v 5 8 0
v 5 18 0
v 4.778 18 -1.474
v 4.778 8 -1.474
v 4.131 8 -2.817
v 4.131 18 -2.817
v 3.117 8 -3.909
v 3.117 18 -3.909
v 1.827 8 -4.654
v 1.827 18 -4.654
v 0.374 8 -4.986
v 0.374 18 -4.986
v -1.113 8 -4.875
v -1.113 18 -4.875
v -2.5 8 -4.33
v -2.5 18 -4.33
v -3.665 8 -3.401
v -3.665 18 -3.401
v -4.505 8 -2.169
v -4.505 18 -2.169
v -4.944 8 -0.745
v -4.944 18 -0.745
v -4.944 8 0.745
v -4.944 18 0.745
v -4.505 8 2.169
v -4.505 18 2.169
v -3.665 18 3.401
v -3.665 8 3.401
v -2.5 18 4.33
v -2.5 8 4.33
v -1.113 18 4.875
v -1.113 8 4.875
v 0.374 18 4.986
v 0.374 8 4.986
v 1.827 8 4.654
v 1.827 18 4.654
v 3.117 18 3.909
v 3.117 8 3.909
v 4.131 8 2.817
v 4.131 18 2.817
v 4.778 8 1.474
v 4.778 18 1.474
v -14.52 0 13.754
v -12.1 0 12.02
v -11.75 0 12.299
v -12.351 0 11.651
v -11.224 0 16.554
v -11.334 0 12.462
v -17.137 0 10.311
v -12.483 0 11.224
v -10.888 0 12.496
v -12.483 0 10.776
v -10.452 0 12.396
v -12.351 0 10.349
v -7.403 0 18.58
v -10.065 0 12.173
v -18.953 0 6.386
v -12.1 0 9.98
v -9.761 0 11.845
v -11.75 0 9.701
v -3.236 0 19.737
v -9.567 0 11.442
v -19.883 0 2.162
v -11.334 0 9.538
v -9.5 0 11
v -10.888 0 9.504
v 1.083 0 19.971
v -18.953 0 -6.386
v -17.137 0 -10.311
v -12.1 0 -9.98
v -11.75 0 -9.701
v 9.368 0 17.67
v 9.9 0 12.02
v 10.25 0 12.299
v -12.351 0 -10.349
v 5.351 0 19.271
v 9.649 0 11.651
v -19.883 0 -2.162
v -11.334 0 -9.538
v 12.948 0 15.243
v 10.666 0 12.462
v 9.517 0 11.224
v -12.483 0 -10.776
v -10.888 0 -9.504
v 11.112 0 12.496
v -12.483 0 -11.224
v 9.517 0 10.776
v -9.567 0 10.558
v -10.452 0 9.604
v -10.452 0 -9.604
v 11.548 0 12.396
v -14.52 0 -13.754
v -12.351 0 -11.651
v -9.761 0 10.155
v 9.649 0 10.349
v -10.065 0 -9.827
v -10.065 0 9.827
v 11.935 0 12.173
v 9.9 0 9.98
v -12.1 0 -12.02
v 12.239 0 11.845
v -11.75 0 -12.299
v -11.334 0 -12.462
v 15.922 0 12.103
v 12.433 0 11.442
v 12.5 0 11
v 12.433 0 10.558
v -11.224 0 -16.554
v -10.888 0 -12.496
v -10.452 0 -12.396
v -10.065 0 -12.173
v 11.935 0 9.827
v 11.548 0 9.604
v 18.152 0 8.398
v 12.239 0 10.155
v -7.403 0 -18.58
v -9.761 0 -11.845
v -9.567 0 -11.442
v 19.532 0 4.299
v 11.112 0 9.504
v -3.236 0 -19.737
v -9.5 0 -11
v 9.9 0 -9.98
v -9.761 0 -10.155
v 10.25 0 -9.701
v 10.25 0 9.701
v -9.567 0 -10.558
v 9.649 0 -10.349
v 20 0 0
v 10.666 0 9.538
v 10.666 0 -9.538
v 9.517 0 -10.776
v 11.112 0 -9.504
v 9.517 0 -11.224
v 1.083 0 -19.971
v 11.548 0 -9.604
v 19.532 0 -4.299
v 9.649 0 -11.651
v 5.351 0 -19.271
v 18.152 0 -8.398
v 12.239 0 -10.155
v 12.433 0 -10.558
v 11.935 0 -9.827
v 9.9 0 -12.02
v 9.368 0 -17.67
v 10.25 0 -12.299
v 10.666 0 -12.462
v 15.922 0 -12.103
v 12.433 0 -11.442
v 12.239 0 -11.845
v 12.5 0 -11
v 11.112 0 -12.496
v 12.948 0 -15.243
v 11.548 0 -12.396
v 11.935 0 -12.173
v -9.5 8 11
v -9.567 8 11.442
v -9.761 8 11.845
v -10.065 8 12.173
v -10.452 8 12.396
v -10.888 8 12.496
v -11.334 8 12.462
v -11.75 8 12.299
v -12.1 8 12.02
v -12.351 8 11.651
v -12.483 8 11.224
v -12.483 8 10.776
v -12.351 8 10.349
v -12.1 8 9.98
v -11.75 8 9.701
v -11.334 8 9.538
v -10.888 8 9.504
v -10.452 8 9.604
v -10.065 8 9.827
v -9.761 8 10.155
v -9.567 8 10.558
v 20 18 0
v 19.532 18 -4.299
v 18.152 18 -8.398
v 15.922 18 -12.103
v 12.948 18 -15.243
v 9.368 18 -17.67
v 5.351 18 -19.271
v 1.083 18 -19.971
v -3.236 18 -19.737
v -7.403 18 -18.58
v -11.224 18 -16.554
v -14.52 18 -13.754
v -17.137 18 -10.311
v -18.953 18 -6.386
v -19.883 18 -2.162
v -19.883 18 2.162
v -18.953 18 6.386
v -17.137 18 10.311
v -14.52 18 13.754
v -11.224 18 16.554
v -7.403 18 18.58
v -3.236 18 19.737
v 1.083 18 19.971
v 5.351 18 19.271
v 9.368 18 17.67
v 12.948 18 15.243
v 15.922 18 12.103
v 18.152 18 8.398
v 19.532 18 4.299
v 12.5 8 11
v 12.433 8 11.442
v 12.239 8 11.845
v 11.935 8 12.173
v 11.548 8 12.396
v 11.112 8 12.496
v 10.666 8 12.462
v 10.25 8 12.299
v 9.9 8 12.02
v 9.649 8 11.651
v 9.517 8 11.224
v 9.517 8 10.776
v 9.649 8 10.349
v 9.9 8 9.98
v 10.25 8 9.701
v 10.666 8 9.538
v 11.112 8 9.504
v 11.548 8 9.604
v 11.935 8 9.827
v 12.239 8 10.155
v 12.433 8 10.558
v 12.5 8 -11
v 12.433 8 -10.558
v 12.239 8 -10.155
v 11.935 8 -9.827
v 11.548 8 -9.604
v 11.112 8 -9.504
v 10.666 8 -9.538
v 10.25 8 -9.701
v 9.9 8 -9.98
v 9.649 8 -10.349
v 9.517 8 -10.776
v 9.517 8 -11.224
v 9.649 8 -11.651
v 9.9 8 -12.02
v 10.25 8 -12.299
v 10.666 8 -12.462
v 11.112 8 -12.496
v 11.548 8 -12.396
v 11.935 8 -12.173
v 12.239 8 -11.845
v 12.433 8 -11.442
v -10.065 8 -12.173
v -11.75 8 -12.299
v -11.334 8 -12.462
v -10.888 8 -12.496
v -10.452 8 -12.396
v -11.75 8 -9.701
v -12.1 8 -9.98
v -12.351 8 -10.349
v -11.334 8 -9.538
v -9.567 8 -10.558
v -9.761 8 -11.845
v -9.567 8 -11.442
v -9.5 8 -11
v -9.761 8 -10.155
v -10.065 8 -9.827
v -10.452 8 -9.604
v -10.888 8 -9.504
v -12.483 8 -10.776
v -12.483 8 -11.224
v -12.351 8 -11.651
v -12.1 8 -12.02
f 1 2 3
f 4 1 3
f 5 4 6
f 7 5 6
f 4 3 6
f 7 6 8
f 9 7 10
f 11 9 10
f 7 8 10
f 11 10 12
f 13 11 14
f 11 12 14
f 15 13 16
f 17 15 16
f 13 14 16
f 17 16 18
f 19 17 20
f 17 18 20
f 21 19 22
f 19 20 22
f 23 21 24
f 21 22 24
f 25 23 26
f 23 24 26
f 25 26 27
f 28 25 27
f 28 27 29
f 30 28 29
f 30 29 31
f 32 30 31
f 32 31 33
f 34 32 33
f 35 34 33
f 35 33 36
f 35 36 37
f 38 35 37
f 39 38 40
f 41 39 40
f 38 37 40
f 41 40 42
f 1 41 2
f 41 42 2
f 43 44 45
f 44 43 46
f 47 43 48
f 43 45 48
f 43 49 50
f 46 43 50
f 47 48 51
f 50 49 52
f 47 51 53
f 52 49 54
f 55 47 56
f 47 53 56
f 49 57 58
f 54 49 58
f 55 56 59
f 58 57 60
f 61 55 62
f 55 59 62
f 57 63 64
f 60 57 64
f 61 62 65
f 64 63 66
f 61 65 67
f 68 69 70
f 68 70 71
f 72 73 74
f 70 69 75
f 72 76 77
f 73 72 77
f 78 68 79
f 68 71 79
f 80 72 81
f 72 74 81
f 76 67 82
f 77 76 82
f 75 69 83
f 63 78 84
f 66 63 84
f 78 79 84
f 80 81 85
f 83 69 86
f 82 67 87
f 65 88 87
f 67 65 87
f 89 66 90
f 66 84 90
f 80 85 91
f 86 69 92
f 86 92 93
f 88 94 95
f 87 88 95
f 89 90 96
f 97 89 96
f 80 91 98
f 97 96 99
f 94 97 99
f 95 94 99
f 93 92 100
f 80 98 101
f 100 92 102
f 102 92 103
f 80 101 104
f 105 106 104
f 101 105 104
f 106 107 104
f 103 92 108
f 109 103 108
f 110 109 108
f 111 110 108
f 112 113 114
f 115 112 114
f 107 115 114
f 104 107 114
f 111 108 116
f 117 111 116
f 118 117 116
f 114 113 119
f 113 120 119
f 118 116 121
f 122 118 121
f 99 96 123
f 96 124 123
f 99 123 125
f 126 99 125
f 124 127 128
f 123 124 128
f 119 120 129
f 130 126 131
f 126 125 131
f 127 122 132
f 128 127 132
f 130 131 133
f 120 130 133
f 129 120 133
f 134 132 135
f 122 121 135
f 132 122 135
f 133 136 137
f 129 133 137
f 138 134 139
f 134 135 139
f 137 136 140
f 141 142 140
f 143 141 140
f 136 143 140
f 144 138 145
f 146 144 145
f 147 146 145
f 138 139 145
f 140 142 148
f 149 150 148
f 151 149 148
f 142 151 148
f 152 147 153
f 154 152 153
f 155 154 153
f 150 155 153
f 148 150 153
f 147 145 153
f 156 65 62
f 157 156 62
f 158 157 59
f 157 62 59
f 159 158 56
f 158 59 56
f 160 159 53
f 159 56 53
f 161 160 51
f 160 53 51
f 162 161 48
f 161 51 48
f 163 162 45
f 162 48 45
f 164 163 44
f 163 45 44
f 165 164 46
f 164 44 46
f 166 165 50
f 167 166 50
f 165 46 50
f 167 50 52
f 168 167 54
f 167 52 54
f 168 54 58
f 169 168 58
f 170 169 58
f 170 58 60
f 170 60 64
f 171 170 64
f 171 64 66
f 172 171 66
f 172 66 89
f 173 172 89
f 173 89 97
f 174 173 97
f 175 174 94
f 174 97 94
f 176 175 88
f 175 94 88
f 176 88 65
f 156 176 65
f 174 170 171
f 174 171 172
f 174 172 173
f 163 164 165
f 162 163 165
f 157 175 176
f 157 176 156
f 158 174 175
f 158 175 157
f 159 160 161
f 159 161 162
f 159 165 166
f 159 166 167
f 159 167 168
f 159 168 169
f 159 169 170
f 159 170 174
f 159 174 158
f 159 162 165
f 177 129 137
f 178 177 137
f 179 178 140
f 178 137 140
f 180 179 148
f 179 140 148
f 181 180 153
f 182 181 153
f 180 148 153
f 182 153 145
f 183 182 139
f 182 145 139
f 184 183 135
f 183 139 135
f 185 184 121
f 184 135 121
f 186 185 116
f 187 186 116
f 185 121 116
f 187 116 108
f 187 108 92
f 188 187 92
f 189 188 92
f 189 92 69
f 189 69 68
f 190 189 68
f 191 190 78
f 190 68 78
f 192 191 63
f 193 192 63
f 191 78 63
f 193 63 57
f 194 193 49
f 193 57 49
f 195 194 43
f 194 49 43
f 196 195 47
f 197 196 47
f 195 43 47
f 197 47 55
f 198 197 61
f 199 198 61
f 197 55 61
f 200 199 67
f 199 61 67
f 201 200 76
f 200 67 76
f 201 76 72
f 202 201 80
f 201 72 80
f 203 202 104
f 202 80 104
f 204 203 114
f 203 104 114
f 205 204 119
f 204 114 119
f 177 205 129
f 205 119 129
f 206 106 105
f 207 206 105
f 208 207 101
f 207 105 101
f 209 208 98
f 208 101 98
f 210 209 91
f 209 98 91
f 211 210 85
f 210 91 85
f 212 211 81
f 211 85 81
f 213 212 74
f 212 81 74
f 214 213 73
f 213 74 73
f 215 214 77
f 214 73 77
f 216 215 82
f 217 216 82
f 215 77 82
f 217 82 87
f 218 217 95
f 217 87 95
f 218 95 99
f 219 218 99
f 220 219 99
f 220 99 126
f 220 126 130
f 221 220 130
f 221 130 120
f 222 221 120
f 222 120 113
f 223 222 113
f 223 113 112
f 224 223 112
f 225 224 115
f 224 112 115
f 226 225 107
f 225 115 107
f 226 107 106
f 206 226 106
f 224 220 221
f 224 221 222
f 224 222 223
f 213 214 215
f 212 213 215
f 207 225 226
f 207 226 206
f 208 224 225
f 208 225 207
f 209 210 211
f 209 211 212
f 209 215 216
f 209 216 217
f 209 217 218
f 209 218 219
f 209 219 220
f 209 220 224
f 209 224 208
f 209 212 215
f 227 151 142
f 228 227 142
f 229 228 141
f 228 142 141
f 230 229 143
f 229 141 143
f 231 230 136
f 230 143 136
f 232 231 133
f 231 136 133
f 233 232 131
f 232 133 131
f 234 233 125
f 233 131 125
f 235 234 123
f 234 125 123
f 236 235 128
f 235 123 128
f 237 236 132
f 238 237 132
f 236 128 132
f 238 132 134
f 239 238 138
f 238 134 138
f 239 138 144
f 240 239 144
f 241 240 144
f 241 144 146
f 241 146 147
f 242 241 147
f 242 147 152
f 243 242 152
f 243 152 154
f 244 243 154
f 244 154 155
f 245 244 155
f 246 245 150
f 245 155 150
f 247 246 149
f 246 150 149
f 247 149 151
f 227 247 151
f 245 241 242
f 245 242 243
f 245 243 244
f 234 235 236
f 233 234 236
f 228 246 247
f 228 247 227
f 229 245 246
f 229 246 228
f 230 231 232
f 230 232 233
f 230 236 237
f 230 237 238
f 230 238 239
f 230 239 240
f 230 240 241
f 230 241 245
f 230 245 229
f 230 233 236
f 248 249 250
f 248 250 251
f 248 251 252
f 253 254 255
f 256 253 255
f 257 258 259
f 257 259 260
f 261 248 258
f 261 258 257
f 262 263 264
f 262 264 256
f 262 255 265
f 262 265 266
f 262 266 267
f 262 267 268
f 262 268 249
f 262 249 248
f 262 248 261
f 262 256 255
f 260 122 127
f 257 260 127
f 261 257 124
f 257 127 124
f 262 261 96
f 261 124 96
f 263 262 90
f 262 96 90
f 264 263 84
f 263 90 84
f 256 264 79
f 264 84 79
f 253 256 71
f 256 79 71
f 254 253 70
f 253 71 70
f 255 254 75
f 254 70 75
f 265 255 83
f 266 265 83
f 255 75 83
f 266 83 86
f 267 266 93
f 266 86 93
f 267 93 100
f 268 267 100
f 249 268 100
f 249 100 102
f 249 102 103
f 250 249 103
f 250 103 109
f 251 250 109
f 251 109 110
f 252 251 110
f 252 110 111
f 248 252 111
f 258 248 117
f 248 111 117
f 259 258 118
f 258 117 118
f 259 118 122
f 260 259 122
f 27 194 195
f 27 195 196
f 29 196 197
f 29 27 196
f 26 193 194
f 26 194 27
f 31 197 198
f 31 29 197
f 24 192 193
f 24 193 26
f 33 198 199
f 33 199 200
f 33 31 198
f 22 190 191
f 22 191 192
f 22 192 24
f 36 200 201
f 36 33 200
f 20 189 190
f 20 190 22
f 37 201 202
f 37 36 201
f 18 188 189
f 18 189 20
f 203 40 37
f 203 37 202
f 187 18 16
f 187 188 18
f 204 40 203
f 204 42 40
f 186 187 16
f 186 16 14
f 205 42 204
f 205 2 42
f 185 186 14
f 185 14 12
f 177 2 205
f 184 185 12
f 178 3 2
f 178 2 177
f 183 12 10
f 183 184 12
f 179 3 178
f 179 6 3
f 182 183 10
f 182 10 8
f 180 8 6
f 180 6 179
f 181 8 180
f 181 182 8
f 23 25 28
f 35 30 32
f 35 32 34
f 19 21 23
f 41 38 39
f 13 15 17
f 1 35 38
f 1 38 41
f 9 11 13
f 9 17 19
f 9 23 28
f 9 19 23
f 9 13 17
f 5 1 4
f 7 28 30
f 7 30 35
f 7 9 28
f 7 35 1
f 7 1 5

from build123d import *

# Parameters (mm, degrees)
SKETCH1_R           = 20
BOSS_EXTRUDE1_DEPTH = 18
SKETCH2_R           = 5
CUT_EXTRUDE1_DEPTH  = 10
SKETCH3_R           = 1.5
CUT_EXTRUDE2_DEPTH  = 8


with BuildPart() as part:
    # Sketch1 → Boss-Extrude1 (new body)
    with BuildSketch(Plane(origin=(0, 0, 0), x_dir=(1, 0, 0), z_dir=(0, 1, 0))):
        Circle(SKETCH1_R)
    extrude(amount=BOSS_EXTRUDE1_DEPTH)

    # Sketch2 → Cut-Extrude1 (cut)
    with BuildSketch(Plane(origin=(0, 18, 0), x_dir=(1, 0, 0), z_dir=(0, 1, 0))):
        Circle(SKETCH2_R)
    extrude(amount=-CUT_EXTRUDE1_DEPTH, mode=Mode.SUBTRACT)

    # Sketch3 → Cut-Extrude2 (cut)
    with BuildSketch(Plane.XZ):
        with Locations((11, -11)):
            Circle(SKETCH3_R)
        with Locations((-11, -11)):
            Circle(SKETCH3_R)
        with Locations((11, 11)):
            Circle(SKETCH3_R)
        with Locations((-11, 11)):
            Circle(SKETCH3_R)
    extrude(amount=-CUT_EXTRUDE2_DEPTH, mode=Mode.SUBTRACT)


solid = part.part
